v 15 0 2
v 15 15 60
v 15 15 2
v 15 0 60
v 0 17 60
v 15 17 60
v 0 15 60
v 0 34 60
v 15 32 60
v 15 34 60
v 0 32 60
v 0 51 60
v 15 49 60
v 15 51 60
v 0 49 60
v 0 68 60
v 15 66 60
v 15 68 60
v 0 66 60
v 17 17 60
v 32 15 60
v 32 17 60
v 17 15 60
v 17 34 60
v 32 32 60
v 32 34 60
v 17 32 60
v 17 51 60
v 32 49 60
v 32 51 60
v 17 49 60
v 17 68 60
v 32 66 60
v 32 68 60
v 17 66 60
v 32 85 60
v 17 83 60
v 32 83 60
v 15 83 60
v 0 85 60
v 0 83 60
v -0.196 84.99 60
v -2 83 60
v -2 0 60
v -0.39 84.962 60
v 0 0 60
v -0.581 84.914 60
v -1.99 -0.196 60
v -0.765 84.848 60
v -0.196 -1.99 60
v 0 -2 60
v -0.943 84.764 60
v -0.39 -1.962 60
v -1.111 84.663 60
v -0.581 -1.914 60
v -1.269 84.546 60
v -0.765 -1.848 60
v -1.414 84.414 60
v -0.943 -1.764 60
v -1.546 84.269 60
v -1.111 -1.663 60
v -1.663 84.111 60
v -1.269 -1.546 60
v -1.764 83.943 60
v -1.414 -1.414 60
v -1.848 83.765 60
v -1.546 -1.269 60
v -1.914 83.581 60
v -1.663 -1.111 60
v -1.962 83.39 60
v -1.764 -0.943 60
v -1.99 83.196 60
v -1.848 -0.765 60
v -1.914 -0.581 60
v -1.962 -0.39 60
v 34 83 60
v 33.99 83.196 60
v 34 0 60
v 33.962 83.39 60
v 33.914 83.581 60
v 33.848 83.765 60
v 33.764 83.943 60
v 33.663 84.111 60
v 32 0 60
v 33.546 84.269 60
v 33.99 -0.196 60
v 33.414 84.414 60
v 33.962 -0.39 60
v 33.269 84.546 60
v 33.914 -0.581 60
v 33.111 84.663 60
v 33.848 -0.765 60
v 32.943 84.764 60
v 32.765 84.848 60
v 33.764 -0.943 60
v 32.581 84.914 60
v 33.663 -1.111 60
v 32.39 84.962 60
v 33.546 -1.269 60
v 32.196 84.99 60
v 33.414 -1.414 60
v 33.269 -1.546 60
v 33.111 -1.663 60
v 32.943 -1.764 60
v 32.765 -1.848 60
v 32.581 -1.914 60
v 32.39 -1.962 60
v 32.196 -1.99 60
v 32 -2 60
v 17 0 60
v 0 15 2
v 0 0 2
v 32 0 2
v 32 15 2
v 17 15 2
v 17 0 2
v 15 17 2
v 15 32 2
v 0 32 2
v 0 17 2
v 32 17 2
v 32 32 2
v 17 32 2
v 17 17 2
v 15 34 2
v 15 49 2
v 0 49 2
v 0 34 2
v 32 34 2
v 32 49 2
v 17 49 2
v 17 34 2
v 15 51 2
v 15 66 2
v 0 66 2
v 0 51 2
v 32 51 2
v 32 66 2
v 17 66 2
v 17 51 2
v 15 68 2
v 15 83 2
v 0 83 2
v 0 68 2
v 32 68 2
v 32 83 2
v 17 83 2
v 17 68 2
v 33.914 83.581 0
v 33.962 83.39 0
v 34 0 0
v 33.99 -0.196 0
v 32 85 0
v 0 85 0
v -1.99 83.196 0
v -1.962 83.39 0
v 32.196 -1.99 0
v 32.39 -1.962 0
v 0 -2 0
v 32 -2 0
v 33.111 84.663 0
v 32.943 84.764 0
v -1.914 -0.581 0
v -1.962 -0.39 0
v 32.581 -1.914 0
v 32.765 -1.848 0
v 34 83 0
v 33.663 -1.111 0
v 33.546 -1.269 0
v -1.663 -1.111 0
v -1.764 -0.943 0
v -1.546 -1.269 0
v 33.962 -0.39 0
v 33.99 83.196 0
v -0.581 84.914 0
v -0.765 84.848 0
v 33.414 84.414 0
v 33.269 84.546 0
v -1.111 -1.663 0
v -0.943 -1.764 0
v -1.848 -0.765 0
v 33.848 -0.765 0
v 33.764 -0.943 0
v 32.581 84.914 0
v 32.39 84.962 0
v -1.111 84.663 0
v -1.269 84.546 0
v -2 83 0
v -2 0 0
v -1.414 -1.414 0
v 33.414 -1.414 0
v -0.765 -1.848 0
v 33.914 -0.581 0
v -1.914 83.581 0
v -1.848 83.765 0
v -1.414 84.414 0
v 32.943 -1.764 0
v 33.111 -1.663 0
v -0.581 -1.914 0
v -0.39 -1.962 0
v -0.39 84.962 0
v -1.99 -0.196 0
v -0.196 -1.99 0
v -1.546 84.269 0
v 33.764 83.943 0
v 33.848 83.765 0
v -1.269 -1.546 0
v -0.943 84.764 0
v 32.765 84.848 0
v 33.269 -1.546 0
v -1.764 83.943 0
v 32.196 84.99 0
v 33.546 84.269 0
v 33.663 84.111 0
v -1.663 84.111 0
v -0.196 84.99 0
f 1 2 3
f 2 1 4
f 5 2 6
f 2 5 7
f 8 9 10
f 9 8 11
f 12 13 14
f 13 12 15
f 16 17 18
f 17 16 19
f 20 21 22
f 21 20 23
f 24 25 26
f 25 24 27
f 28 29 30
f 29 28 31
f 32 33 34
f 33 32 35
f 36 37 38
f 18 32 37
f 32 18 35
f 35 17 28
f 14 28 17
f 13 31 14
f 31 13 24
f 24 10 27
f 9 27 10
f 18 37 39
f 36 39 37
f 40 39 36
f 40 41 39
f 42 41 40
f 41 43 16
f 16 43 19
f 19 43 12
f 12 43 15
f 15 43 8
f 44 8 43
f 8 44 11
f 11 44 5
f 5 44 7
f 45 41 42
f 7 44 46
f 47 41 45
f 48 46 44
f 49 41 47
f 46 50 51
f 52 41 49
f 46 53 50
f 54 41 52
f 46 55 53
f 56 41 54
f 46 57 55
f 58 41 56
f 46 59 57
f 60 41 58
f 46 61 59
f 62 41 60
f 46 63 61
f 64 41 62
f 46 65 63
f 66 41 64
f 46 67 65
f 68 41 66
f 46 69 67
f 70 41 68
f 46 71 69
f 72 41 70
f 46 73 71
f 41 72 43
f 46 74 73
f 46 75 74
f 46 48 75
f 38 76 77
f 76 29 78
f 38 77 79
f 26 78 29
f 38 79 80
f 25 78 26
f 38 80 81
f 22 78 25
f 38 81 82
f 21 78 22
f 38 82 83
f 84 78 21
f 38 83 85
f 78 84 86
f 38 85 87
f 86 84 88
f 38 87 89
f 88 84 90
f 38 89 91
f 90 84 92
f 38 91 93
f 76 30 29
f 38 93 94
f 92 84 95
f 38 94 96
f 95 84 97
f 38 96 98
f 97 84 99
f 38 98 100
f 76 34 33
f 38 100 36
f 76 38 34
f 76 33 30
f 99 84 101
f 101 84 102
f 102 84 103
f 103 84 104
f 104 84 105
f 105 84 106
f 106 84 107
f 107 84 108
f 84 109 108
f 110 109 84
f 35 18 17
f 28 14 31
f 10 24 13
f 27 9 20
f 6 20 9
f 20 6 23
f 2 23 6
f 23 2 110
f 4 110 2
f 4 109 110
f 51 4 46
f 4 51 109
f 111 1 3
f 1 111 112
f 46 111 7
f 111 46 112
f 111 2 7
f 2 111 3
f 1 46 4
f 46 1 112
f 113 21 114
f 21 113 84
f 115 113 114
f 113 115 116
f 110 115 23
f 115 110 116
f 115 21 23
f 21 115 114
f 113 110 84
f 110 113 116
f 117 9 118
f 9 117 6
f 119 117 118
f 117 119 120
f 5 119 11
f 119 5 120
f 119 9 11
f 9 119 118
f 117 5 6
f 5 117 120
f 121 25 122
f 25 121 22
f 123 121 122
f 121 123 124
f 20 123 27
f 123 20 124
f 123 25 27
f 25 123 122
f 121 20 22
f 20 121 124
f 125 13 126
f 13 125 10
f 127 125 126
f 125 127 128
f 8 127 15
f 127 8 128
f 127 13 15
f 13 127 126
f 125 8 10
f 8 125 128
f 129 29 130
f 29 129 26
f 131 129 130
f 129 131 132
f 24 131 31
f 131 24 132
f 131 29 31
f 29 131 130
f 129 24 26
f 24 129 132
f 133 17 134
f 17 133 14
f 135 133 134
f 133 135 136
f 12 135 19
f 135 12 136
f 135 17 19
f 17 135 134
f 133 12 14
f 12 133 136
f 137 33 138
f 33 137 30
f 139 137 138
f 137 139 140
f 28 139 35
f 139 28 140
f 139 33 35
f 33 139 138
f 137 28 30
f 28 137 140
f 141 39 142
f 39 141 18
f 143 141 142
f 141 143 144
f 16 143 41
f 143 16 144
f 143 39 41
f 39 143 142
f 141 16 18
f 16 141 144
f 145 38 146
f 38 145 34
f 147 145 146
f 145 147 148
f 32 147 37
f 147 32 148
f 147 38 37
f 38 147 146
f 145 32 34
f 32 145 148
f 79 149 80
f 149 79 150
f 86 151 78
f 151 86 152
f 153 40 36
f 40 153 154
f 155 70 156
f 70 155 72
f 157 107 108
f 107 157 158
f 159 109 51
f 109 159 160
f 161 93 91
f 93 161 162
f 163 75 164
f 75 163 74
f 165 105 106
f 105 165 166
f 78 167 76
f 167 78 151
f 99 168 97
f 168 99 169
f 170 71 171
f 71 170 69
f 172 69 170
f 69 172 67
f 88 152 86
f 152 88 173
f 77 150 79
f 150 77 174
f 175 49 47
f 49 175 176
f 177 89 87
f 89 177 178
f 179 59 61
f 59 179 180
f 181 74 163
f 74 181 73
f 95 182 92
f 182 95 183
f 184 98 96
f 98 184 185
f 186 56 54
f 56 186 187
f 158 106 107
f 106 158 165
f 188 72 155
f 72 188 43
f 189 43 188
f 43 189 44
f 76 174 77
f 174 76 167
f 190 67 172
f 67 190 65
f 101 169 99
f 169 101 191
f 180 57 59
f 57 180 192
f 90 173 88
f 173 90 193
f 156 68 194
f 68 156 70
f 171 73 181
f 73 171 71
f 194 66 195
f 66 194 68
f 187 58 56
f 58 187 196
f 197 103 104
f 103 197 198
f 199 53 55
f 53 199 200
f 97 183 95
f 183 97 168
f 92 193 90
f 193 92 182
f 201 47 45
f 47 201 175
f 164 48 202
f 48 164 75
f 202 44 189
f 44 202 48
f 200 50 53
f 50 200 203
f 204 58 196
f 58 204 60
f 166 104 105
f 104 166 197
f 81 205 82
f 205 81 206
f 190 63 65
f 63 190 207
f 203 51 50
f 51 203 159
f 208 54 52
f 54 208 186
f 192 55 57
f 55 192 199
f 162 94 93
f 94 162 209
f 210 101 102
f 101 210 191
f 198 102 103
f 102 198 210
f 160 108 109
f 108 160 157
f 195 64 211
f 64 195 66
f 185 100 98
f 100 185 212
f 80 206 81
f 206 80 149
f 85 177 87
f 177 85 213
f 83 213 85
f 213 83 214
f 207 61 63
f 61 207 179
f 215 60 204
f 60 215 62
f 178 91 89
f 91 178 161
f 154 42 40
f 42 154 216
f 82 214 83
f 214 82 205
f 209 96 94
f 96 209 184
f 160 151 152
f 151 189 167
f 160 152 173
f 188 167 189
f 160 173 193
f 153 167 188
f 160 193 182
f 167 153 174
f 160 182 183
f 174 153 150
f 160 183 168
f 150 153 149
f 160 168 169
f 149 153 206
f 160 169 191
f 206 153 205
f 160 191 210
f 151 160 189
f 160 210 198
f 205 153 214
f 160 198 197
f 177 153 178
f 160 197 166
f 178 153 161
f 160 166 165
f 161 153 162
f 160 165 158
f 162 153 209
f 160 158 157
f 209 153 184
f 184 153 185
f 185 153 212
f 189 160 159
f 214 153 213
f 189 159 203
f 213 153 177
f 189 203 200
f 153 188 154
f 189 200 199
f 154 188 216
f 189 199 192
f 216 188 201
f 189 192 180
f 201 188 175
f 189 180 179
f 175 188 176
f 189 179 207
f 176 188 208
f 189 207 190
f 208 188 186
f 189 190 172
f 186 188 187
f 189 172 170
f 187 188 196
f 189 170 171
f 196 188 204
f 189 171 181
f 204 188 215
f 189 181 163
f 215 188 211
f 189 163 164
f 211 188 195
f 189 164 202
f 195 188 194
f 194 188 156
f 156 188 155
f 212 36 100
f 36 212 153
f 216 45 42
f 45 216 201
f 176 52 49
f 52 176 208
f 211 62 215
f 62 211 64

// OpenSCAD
rows = 2;
columns = 5;
size = 15;
wall = 2;

case_height = 60;

case_width = rows * size + ((rows-1)+2)*wall;
case_lenght = columns * size + ((columns-1)+2)*wall;

// ========================
// Rounded rectangle module
// ========================
module rounded_rect(x, y, radius) {
    minkowski() {
        square([x - 2*radius, y - 2*radius], center = false);
        circle(r = radius, $fn = 64);
    }
}

// ========================
// Tweezers case
// ========================
module case() {
    // Corner radius
    corner_r = 2;

    difference() {
            // Outer shell (walls included)
            linear_extrude(height = case_height)
                rounded_rect(case_width, case_lenght, corner_r);
        
            translate([-corner_r + wall, -corner_r + wall, wall]) {
                for (y = [0 : columns-1]) {
                    for (x = [0 : rows-1]) {
                        translate([x*(size+wall), y*(size+wall), 0])
                            cube([size, size, case_height-wall]);
                    }
                }
            }
    }
}

// Draw the case
case();
